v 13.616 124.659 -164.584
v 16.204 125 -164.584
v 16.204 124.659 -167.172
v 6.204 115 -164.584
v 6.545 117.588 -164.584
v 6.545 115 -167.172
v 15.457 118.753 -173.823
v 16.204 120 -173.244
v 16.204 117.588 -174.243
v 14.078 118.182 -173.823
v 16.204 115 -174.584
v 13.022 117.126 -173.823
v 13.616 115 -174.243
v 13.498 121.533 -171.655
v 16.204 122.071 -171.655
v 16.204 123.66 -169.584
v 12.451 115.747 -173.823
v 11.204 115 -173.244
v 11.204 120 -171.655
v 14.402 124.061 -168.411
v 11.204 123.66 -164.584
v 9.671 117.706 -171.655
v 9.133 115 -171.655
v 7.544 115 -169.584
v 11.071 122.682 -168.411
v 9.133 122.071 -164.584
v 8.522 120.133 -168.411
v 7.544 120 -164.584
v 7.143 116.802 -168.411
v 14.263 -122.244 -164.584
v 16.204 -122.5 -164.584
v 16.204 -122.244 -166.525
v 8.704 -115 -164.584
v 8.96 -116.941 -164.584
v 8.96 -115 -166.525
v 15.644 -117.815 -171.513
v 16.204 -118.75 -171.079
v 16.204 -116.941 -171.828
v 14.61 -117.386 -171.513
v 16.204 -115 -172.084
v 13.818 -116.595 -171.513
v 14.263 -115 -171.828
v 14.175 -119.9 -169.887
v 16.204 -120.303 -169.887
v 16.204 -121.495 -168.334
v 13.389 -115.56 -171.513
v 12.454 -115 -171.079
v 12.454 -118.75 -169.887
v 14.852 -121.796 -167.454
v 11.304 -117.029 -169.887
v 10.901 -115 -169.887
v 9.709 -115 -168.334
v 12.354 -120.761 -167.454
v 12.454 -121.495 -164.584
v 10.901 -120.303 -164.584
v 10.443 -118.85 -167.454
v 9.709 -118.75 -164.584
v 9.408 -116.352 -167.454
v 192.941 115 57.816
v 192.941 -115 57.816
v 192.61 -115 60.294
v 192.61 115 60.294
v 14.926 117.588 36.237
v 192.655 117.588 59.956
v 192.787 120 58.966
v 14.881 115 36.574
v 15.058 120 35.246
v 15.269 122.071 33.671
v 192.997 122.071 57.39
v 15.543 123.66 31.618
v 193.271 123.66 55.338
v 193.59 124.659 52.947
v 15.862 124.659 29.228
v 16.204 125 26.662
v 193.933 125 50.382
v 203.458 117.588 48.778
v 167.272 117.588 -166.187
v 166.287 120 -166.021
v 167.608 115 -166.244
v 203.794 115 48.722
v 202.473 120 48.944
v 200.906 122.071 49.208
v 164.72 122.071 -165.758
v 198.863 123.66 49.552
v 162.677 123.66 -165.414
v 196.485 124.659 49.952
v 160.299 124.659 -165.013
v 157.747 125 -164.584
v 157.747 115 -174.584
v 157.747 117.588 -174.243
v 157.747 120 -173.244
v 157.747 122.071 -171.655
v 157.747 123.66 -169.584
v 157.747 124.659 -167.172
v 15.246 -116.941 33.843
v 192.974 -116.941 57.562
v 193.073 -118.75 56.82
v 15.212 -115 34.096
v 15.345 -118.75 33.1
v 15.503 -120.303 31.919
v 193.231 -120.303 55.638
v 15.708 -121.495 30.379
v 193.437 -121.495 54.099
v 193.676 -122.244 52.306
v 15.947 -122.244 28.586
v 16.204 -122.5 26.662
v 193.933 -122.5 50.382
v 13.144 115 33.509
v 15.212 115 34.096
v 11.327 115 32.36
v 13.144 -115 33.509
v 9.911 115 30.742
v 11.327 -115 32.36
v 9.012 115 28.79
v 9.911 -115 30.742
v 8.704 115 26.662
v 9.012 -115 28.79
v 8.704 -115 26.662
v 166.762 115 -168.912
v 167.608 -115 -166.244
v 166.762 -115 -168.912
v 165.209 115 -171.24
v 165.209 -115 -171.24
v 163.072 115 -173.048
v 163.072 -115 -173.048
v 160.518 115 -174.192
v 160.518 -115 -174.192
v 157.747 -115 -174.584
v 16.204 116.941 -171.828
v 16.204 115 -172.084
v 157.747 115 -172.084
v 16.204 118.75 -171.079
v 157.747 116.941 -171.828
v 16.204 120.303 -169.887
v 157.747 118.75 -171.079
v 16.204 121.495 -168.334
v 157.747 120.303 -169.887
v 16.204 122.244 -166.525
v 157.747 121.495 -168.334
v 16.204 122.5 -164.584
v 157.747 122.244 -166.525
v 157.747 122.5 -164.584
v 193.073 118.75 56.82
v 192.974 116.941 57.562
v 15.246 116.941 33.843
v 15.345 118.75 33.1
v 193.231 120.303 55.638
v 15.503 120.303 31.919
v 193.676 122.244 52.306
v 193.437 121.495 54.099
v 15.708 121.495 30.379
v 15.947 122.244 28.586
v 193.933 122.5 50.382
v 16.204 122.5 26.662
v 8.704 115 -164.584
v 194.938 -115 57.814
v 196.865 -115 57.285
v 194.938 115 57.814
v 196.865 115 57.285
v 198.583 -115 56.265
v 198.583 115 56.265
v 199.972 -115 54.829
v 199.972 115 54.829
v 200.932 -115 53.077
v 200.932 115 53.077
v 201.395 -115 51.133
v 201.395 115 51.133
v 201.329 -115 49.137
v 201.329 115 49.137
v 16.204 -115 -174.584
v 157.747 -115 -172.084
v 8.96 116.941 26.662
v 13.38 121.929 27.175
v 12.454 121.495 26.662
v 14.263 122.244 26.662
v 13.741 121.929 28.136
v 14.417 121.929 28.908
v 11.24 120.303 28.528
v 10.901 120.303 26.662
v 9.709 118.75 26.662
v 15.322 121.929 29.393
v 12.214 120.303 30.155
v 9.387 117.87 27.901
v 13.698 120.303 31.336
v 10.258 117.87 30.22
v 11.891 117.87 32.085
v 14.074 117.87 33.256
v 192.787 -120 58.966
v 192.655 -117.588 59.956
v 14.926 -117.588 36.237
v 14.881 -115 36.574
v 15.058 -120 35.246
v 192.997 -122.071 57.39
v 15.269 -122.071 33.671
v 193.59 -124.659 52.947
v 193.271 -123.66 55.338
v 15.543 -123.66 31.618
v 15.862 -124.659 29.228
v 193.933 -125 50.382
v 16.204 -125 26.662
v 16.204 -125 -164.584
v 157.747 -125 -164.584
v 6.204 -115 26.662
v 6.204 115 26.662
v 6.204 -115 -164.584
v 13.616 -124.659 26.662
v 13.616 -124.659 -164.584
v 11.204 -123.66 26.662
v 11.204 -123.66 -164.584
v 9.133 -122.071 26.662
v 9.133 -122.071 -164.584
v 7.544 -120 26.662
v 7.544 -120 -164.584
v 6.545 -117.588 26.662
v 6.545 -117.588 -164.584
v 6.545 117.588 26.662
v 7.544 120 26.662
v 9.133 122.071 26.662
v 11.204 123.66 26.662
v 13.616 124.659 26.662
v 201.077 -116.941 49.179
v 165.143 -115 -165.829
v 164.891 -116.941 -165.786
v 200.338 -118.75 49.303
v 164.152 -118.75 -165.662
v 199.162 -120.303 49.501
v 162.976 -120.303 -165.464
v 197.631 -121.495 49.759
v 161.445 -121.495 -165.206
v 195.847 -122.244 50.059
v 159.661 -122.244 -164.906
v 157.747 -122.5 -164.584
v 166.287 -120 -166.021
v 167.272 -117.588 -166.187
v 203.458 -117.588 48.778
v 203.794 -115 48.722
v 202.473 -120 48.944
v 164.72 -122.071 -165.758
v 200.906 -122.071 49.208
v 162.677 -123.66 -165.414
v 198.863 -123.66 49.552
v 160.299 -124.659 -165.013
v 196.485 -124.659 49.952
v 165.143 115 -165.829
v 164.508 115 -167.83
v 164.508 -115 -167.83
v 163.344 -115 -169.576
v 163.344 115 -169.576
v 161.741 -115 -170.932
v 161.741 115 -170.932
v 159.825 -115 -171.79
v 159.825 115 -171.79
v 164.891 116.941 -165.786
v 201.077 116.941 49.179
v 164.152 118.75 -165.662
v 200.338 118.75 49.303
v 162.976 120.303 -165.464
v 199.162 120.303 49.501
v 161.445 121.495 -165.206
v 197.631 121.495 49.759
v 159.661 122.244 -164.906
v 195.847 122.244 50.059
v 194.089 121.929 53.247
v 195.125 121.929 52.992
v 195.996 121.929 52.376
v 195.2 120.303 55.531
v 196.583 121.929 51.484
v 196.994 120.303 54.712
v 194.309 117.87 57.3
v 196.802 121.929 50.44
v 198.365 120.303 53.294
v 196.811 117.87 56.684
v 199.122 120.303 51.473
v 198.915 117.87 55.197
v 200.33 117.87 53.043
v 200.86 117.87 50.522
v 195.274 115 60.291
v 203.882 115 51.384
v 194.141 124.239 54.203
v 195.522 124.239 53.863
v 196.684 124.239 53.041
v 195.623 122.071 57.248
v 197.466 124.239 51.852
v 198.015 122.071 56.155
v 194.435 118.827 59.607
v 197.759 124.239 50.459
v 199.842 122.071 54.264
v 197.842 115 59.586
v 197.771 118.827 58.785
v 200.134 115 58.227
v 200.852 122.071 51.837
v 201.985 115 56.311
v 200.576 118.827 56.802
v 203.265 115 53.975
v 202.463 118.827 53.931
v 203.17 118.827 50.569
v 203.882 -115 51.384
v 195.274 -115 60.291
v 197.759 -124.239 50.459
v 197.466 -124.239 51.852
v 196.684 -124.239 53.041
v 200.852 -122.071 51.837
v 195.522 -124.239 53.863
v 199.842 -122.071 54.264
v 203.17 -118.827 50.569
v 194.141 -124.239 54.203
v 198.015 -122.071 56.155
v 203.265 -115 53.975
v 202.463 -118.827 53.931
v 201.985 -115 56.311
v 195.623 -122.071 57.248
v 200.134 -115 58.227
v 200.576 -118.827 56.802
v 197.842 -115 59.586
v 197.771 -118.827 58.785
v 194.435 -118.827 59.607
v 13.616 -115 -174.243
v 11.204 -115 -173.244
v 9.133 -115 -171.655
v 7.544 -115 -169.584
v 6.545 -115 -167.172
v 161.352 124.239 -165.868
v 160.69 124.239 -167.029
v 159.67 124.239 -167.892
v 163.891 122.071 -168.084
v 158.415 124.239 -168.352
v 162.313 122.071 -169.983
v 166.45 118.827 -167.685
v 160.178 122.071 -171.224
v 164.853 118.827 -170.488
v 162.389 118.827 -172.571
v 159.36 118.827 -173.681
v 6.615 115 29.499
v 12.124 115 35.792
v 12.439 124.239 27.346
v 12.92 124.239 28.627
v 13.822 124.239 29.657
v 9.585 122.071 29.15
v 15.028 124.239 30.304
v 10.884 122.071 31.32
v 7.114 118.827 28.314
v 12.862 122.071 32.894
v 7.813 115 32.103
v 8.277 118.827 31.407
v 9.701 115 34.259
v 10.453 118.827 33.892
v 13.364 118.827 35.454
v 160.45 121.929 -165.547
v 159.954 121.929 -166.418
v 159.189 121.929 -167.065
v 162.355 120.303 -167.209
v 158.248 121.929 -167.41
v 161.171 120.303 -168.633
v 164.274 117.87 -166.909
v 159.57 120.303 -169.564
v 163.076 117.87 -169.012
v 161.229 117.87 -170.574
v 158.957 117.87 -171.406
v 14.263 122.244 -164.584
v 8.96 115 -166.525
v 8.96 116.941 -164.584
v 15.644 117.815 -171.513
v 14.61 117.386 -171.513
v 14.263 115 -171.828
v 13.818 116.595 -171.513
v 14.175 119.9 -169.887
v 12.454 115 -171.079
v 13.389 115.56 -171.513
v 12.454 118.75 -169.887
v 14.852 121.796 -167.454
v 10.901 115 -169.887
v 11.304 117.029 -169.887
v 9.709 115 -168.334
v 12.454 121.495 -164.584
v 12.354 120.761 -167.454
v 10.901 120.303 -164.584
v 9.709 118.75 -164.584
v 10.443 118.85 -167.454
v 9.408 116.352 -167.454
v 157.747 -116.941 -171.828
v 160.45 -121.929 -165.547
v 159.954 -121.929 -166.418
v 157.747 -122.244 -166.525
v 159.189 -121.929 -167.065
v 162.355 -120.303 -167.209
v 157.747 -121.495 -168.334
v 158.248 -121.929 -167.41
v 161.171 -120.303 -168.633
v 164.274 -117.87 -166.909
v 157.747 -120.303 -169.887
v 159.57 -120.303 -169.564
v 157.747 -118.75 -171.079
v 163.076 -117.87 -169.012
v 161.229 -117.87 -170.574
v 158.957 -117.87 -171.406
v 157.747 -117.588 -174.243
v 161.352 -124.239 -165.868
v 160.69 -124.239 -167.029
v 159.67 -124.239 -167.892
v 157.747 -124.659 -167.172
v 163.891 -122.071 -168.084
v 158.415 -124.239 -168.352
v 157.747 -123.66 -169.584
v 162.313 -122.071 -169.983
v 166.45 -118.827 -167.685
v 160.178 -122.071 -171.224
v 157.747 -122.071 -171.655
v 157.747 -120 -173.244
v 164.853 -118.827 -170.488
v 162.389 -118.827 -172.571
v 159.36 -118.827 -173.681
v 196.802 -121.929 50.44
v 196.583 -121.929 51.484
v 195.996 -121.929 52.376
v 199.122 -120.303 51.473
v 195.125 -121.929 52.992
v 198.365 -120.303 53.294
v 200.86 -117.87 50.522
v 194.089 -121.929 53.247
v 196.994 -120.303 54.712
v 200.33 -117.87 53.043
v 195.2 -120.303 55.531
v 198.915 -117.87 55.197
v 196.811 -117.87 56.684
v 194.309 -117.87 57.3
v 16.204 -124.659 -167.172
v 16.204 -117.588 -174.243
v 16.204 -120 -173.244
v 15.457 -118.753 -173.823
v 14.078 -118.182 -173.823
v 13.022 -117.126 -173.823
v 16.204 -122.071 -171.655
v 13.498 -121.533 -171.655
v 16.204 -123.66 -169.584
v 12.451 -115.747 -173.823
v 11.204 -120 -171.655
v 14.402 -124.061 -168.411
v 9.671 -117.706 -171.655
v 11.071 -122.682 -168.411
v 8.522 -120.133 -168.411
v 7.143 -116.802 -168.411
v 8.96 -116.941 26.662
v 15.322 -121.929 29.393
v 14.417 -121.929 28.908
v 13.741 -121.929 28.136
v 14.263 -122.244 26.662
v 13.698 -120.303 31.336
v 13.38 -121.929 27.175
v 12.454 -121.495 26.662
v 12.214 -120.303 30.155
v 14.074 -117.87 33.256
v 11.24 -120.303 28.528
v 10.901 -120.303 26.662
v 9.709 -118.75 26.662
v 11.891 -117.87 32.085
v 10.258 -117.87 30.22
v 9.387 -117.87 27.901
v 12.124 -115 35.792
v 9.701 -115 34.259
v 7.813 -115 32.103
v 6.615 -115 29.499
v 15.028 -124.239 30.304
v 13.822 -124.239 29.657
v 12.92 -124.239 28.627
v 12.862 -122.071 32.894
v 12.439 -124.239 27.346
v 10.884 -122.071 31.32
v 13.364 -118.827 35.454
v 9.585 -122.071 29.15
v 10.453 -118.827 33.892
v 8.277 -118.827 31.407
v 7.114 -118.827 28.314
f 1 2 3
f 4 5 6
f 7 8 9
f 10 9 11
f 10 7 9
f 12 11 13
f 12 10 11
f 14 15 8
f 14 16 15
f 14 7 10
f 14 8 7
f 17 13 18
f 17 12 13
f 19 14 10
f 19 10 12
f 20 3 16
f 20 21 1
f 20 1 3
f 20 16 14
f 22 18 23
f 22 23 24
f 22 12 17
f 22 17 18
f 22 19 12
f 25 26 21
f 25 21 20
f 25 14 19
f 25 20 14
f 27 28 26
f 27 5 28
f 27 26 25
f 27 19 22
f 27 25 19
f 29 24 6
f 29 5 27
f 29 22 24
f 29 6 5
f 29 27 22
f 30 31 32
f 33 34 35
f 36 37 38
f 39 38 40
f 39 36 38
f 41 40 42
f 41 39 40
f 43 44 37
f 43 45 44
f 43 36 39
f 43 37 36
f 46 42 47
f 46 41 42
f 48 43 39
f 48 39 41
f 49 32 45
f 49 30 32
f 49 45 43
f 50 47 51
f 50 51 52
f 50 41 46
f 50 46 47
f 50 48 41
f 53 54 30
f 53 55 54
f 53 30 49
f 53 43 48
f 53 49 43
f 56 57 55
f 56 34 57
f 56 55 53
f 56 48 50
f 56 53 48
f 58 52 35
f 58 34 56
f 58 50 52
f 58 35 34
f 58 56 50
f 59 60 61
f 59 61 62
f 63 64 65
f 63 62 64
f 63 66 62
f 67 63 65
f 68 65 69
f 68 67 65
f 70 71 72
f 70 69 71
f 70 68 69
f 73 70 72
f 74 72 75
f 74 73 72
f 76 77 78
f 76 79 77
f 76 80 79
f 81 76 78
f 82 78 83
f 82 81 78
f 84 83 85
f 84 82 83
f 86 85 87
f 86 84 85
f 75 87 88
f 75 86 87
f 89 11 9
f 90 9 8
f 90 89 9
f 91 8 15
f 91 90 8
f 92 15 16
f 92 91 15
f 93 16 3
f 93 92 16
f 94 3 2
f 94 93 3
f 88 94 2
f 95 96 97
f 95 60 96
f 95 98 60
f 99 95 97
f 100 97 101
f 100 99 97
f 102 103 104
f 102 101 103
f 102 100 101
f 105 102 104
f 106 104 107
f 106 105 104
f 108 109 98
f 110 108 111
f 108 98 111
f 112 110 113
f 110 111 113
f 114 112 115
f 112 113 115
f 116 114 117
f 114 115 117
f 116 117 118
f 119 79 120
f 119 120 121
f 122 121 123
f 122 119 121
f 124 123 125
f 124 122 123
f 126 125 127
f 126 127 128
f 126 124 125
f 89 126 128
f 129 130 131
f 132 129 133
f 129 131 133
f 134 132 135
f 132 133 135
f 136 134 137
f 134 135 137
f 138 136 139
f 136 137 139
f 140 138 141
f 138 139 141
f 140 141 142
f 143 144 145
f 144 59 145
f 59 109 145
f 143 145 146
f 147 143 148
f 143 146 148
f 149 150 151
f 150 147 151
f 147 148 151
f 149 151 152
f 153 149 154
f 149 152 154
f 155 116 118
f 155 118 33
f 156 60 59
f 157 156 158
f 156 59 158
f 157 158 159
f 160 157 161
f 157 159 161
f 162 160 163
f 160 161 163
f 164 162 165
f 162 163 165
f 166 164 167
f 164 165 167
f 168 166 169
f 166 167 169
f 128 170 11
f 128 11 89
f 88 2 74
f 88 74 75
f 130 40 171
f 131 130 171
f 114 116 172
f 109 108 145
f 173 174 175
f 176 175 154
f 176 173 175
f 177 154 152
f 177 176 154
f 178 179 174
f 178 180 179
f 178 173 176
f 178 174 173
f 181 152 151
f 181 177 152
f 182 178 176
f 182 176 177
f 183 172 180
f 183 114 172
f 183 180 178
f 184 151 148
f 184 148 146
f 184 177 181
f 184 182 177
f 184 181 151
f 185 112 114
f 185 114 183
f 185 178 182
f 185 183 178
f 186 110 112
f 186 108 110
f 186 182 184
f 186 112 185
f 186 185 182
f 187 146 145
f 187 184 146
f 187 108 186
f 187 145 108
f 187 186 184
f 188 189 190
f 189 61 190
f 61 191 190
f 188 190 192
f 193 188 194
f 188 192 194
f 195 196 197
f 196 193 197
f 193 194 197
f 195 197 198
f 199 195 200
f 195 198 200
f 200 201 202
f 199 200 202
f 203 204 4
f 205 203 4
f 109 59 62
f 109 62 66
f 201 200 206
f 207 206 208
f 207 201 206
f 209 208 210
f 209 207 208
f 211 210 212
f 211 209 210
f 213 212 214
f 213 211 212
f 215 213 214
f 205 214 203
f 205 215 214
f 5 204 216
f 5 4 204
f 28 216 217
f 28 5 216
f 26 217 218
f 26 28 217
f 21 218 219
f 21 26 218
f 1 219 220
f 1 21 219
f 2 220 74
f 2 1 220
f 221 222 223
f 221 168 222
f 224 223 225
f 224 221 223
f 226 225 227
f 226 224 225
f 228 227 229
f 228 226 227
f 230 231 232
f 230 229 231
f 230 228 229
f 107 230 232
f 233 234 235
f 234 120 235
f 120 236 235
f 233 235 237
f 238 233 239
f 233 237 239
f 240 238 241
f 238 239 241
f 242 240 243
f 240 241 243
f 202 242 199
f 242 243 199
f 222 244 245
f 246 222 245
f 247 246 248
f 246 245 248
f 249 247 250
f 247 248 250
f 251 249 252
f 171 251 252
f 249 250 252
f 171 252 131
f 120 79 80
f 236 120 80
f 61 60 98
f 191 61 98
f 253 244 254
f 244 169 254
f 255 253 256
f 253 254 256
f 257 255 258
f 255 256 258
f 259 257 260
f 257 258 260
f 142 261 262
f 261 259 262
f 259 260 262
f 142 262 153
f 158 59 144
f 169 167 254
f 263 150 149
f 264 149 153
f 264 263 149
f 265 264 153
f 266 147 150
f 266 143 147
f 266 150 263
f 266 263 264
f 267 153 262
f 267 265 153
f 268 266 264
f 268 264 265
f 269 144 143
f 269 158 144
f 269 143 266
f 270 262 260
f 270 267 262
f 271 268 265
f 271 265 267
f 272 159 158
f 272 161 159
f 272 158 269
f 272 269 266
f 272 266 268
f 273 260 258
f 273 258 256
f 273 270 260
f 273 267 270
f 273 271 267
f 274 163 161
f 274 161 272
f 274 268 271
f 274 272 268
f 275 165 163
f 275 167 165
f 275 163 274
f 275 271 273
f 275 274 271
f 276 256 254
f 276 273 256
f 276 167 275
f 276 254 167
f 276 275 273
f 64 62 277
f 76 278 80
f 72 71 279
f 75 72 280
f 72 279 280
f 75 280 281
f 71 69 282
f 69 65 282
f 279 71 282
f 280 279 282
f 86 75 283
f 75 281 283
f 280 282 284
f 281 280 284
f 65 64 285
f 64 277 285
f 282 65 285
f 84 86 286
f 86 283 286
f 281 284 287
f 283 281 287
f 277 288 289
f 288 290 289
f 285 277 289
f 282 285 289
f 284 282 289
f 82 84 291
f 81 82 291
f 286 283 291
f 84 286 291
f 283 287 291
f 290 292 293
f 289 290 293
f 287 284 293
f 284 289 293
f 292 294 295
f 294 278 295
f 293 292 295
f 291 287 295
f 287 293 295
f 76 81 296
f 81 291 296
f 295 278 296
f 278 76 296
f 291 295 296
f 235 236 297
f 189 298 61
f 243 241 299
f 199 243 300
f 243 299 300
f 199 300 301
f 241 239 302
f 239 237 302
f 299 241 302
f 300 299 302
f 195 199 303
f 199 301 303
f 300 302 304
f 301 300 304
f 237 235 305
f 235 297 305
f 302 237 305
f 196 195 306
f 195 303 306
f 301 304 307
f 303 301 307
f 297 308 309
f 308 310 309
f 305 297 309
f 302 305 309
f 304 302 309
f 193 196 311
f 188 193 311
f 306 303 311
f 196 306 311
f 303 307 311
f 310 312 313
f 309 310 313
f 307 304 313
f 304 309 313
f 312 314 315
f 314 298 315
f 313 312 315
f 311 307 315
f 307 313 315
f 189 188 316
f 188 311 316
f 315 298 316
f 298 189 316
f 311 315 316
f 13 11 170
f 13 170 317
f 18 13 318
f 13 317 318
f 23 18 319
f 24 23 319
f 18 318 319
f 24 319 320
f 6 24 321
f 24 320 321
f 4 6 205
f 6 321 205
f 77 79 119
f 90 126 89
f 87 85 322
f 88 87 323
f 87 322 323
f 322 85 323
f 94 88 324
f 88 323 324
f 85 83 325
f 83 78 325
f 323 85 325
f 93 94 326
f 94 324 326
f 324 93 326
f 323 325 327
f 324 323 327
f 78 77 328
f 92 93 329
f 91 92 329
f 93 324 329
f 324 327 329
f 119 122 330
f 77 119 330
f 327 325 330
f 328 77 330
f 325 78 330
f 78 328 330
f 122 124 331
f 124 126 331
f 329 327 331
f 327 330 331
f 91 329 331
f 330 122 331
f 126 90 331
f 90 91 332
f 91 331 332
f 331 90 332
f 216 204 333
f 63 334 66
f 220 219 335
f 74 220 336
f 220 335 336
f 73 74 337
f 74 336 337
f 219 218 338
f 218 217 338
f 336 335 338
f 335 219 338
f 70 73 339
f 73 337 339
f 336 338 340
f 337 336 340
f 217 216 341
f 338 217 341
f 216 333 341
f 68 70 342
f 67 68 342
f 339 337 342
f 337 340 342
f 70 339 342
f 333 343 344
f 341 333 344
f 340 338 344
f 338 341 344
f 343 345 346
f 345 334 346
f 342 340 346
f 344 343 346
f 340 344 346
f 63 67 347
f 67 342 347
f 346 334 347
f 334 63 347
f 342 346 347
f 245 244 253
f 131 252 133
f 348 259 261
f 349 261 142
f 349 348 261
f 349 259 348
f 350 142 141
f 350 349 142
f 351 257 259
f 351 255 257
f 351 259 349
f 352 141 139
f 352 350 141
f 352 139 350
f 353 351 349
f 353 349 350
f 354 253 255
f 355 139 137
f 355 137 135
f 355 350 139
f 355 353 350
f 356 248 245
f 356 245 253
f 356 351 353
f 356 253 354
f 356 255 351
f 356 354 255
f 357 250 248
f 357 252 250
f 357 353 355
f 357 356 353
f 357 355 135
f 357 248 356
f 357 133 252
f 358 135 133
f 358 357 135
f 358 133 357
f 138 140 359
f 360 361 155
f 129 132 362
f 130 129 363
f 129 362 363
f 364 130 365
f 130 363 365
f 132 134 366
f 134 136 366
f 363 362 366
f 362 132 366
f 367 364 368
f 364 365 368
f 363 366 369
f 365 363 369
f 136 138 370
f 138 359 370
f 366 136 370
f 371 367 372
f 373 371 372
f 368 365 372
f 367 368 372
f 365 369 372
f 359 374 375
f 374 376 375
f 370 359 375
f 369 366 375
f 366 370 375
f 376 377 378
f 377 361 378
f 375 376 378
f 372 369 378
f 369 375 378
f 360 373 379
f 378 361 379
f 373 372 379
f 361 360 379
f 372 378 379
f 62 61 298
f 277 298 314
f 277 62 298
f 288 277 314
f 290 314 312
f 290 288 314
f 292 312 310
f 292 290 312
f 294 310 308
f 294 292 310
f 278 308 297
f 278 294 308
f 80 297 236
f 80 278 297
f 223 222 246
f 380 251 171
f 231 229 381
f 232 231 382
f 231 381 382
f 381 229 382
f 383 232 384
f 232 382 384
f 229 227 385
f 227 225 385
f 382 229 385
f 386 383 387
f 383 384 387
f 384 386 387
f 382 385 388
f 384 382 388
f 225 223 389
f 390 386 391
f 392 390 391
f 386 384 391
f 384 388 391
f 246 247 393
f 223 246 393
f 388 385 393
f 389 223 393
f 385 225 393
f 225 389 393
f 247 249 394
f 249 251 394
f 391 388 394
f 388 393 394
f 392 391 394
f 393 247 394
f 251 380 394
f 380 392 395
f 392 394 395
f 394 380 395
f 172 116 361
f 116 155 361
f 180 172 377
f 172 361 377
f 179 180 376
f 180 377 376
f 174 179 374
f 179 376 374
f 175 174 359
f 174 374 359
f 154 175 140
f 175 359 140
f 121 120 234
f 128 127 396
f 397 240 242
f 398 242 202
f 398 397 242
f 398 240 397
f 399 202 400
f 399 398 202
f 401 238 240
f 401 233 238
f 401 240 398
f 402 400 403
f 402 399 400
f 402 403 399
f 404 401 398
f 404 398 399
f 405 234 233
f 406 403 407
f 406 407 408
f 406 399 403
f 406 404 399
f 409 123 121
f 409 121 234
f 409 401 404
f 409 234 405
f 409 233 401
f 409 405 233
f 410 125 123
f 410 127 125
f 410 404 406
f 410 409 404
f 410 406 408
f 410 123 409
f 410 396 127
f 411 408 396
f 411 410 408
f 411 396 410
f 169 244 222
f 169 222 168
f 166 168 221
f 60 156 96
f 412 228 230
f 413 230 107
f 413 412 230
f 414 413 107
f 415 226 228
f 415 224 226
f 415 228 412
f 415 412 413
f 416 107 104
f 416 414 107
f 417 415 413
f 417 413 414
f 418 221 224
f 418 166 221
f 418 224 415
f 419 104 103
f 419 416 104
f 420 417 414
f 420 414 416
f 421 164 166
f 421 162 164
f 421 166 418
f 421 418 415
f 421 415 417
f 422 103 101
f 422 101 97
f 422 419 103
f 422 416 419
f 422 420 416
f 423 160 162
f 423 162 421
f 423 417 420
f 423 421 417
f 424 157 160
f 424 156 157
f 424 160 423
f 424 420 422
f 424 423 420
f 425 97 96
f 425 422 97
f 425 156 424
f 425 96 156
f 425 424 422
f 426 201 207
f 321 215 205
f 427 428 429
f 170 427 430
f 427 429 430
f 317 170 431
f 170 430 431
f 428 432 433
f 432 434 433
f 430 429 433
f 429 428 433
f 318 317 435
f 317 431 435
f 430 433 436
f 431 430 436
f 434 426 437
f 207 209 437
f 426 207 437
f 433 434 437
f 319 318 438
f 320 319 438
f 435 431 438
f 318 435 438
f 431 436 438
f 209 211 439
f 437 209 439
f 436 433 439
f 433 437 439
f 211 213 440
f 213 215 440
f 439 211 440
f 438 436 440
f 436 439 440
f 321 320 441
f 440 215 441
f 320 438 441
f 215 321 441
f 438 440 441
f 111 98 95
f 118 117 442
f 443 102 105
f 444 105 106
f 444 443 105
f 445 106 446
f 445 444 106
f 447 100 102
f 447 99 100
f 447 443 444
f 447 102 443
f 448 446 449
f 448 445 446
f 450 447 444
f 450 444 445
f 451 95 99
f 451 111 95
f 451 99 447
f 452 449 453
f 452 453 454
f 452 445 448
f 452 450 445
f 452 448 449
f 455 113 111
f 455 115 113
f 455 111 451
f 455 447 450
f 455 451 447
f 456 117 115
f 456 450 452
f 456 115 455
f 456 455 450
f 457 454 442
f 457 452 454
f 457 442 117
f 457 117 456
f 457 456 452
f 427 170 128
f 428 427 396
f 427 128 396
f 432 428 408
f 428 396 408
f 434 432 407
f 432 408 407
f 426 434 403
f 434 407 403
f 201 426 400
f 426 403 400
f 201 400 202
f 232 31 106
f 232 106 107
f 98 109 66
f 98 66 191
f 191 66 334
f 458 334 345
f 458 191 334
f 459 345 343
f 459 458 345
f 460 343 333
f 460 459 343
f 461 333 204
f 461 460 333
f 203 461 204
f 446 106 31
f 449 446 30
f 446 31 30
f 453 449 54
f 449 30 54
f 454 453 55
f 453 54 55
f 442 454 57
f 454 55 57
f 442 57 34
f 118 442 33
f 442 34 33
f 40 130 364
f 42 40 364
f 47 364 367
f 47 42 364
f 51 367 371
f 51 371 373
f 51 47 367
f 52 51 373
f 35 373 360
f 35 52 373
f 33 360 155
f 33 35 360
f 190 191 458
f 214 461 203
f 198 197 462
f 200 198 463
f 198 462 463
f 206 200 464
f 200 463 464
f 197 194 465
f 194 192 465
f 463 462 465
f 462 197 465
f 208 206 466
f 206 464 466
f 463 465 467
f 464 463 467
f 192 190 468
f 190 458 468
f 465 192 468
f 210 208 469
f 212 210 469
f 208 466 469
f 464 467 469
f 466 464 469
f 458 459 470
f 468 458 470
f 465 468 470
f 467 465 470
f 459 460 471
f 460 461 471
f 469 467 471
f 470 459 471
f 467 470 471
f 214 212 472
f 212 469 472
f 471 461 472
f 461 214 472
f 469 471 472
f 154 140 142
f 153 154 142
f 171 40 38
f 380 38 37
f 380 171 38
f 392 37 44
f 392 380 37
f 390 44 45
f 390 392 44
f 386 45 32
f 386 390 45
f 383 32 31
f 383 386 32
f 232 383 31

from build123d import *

# Parameters (mm, degrees)
F1_DEPTH = 125
F3_R     = 10
F4_T     = -2.5


# Not quite as in the source:
# - a shell that OpenCascade refuses in one call is made with other operations: the cavity is built on its own and cut out


with BuildPart() as f1:
    # F0 (on Front) → F1 (new body)
    with BuildSketch(Plane.XZ):
        Polygon((206.0437292722, 62.0864819473), (6.2040649354, 35.4162448123), (6.2040649354, -174.5837551877), (166.2040649354, -174.5837551877), align=None)
    extrude(amount=F1_DEPTH)

    # F2: F1 across plane


with BuildPart() as f1_1:
    add(f1.part)
    add(f1.part.mirror(Plane.XZ))

    # F3
    f3_edges = [f1_1.edges().sort_by_distance(p)[0] for p in [
        (106.123897, -125, 48.751363),
        (206.043729, 0, 62.086482),
        (186.123897, -125, -56.248637),
        (6.204065, -125, -69.583755),
        (86.204065, -125, -174.583755),
        (166.204065, 0, -174.583755),
        (106.123897, 125, 48.751363),
        (6.204065, 0, 35.416245),
        (186.123897, 125, -56.248637),
        (6.204065, 125, -69.583755),
        (86.204065, 125, -174.583755),
        (6.204065, 0, -174.583755),
    ]]
    fillet(f3_edges, radius=F3_R)

    # F4: a shell. OpenCascade refuses it in one call, so the cavity is built on its own and cut out:
    # the body offset inwards by the wall thickness, plus a prism from it out through each open face.
    f4_core = offset(f1_1.part, amount=F4_T, mode=Mode.PRIVATE)
    f4_exits = [f4_core.faces().sort_by_distance(p)[0] for p in [
        (104.076238, 0, 45.955921),
    ]]
    add(f4_core, mode=Mode.SUBTRACT)
    extrude(f4_exits, amount=-F4_T, mode=Mode.SUBTRACT)


solid = f1_1.part
